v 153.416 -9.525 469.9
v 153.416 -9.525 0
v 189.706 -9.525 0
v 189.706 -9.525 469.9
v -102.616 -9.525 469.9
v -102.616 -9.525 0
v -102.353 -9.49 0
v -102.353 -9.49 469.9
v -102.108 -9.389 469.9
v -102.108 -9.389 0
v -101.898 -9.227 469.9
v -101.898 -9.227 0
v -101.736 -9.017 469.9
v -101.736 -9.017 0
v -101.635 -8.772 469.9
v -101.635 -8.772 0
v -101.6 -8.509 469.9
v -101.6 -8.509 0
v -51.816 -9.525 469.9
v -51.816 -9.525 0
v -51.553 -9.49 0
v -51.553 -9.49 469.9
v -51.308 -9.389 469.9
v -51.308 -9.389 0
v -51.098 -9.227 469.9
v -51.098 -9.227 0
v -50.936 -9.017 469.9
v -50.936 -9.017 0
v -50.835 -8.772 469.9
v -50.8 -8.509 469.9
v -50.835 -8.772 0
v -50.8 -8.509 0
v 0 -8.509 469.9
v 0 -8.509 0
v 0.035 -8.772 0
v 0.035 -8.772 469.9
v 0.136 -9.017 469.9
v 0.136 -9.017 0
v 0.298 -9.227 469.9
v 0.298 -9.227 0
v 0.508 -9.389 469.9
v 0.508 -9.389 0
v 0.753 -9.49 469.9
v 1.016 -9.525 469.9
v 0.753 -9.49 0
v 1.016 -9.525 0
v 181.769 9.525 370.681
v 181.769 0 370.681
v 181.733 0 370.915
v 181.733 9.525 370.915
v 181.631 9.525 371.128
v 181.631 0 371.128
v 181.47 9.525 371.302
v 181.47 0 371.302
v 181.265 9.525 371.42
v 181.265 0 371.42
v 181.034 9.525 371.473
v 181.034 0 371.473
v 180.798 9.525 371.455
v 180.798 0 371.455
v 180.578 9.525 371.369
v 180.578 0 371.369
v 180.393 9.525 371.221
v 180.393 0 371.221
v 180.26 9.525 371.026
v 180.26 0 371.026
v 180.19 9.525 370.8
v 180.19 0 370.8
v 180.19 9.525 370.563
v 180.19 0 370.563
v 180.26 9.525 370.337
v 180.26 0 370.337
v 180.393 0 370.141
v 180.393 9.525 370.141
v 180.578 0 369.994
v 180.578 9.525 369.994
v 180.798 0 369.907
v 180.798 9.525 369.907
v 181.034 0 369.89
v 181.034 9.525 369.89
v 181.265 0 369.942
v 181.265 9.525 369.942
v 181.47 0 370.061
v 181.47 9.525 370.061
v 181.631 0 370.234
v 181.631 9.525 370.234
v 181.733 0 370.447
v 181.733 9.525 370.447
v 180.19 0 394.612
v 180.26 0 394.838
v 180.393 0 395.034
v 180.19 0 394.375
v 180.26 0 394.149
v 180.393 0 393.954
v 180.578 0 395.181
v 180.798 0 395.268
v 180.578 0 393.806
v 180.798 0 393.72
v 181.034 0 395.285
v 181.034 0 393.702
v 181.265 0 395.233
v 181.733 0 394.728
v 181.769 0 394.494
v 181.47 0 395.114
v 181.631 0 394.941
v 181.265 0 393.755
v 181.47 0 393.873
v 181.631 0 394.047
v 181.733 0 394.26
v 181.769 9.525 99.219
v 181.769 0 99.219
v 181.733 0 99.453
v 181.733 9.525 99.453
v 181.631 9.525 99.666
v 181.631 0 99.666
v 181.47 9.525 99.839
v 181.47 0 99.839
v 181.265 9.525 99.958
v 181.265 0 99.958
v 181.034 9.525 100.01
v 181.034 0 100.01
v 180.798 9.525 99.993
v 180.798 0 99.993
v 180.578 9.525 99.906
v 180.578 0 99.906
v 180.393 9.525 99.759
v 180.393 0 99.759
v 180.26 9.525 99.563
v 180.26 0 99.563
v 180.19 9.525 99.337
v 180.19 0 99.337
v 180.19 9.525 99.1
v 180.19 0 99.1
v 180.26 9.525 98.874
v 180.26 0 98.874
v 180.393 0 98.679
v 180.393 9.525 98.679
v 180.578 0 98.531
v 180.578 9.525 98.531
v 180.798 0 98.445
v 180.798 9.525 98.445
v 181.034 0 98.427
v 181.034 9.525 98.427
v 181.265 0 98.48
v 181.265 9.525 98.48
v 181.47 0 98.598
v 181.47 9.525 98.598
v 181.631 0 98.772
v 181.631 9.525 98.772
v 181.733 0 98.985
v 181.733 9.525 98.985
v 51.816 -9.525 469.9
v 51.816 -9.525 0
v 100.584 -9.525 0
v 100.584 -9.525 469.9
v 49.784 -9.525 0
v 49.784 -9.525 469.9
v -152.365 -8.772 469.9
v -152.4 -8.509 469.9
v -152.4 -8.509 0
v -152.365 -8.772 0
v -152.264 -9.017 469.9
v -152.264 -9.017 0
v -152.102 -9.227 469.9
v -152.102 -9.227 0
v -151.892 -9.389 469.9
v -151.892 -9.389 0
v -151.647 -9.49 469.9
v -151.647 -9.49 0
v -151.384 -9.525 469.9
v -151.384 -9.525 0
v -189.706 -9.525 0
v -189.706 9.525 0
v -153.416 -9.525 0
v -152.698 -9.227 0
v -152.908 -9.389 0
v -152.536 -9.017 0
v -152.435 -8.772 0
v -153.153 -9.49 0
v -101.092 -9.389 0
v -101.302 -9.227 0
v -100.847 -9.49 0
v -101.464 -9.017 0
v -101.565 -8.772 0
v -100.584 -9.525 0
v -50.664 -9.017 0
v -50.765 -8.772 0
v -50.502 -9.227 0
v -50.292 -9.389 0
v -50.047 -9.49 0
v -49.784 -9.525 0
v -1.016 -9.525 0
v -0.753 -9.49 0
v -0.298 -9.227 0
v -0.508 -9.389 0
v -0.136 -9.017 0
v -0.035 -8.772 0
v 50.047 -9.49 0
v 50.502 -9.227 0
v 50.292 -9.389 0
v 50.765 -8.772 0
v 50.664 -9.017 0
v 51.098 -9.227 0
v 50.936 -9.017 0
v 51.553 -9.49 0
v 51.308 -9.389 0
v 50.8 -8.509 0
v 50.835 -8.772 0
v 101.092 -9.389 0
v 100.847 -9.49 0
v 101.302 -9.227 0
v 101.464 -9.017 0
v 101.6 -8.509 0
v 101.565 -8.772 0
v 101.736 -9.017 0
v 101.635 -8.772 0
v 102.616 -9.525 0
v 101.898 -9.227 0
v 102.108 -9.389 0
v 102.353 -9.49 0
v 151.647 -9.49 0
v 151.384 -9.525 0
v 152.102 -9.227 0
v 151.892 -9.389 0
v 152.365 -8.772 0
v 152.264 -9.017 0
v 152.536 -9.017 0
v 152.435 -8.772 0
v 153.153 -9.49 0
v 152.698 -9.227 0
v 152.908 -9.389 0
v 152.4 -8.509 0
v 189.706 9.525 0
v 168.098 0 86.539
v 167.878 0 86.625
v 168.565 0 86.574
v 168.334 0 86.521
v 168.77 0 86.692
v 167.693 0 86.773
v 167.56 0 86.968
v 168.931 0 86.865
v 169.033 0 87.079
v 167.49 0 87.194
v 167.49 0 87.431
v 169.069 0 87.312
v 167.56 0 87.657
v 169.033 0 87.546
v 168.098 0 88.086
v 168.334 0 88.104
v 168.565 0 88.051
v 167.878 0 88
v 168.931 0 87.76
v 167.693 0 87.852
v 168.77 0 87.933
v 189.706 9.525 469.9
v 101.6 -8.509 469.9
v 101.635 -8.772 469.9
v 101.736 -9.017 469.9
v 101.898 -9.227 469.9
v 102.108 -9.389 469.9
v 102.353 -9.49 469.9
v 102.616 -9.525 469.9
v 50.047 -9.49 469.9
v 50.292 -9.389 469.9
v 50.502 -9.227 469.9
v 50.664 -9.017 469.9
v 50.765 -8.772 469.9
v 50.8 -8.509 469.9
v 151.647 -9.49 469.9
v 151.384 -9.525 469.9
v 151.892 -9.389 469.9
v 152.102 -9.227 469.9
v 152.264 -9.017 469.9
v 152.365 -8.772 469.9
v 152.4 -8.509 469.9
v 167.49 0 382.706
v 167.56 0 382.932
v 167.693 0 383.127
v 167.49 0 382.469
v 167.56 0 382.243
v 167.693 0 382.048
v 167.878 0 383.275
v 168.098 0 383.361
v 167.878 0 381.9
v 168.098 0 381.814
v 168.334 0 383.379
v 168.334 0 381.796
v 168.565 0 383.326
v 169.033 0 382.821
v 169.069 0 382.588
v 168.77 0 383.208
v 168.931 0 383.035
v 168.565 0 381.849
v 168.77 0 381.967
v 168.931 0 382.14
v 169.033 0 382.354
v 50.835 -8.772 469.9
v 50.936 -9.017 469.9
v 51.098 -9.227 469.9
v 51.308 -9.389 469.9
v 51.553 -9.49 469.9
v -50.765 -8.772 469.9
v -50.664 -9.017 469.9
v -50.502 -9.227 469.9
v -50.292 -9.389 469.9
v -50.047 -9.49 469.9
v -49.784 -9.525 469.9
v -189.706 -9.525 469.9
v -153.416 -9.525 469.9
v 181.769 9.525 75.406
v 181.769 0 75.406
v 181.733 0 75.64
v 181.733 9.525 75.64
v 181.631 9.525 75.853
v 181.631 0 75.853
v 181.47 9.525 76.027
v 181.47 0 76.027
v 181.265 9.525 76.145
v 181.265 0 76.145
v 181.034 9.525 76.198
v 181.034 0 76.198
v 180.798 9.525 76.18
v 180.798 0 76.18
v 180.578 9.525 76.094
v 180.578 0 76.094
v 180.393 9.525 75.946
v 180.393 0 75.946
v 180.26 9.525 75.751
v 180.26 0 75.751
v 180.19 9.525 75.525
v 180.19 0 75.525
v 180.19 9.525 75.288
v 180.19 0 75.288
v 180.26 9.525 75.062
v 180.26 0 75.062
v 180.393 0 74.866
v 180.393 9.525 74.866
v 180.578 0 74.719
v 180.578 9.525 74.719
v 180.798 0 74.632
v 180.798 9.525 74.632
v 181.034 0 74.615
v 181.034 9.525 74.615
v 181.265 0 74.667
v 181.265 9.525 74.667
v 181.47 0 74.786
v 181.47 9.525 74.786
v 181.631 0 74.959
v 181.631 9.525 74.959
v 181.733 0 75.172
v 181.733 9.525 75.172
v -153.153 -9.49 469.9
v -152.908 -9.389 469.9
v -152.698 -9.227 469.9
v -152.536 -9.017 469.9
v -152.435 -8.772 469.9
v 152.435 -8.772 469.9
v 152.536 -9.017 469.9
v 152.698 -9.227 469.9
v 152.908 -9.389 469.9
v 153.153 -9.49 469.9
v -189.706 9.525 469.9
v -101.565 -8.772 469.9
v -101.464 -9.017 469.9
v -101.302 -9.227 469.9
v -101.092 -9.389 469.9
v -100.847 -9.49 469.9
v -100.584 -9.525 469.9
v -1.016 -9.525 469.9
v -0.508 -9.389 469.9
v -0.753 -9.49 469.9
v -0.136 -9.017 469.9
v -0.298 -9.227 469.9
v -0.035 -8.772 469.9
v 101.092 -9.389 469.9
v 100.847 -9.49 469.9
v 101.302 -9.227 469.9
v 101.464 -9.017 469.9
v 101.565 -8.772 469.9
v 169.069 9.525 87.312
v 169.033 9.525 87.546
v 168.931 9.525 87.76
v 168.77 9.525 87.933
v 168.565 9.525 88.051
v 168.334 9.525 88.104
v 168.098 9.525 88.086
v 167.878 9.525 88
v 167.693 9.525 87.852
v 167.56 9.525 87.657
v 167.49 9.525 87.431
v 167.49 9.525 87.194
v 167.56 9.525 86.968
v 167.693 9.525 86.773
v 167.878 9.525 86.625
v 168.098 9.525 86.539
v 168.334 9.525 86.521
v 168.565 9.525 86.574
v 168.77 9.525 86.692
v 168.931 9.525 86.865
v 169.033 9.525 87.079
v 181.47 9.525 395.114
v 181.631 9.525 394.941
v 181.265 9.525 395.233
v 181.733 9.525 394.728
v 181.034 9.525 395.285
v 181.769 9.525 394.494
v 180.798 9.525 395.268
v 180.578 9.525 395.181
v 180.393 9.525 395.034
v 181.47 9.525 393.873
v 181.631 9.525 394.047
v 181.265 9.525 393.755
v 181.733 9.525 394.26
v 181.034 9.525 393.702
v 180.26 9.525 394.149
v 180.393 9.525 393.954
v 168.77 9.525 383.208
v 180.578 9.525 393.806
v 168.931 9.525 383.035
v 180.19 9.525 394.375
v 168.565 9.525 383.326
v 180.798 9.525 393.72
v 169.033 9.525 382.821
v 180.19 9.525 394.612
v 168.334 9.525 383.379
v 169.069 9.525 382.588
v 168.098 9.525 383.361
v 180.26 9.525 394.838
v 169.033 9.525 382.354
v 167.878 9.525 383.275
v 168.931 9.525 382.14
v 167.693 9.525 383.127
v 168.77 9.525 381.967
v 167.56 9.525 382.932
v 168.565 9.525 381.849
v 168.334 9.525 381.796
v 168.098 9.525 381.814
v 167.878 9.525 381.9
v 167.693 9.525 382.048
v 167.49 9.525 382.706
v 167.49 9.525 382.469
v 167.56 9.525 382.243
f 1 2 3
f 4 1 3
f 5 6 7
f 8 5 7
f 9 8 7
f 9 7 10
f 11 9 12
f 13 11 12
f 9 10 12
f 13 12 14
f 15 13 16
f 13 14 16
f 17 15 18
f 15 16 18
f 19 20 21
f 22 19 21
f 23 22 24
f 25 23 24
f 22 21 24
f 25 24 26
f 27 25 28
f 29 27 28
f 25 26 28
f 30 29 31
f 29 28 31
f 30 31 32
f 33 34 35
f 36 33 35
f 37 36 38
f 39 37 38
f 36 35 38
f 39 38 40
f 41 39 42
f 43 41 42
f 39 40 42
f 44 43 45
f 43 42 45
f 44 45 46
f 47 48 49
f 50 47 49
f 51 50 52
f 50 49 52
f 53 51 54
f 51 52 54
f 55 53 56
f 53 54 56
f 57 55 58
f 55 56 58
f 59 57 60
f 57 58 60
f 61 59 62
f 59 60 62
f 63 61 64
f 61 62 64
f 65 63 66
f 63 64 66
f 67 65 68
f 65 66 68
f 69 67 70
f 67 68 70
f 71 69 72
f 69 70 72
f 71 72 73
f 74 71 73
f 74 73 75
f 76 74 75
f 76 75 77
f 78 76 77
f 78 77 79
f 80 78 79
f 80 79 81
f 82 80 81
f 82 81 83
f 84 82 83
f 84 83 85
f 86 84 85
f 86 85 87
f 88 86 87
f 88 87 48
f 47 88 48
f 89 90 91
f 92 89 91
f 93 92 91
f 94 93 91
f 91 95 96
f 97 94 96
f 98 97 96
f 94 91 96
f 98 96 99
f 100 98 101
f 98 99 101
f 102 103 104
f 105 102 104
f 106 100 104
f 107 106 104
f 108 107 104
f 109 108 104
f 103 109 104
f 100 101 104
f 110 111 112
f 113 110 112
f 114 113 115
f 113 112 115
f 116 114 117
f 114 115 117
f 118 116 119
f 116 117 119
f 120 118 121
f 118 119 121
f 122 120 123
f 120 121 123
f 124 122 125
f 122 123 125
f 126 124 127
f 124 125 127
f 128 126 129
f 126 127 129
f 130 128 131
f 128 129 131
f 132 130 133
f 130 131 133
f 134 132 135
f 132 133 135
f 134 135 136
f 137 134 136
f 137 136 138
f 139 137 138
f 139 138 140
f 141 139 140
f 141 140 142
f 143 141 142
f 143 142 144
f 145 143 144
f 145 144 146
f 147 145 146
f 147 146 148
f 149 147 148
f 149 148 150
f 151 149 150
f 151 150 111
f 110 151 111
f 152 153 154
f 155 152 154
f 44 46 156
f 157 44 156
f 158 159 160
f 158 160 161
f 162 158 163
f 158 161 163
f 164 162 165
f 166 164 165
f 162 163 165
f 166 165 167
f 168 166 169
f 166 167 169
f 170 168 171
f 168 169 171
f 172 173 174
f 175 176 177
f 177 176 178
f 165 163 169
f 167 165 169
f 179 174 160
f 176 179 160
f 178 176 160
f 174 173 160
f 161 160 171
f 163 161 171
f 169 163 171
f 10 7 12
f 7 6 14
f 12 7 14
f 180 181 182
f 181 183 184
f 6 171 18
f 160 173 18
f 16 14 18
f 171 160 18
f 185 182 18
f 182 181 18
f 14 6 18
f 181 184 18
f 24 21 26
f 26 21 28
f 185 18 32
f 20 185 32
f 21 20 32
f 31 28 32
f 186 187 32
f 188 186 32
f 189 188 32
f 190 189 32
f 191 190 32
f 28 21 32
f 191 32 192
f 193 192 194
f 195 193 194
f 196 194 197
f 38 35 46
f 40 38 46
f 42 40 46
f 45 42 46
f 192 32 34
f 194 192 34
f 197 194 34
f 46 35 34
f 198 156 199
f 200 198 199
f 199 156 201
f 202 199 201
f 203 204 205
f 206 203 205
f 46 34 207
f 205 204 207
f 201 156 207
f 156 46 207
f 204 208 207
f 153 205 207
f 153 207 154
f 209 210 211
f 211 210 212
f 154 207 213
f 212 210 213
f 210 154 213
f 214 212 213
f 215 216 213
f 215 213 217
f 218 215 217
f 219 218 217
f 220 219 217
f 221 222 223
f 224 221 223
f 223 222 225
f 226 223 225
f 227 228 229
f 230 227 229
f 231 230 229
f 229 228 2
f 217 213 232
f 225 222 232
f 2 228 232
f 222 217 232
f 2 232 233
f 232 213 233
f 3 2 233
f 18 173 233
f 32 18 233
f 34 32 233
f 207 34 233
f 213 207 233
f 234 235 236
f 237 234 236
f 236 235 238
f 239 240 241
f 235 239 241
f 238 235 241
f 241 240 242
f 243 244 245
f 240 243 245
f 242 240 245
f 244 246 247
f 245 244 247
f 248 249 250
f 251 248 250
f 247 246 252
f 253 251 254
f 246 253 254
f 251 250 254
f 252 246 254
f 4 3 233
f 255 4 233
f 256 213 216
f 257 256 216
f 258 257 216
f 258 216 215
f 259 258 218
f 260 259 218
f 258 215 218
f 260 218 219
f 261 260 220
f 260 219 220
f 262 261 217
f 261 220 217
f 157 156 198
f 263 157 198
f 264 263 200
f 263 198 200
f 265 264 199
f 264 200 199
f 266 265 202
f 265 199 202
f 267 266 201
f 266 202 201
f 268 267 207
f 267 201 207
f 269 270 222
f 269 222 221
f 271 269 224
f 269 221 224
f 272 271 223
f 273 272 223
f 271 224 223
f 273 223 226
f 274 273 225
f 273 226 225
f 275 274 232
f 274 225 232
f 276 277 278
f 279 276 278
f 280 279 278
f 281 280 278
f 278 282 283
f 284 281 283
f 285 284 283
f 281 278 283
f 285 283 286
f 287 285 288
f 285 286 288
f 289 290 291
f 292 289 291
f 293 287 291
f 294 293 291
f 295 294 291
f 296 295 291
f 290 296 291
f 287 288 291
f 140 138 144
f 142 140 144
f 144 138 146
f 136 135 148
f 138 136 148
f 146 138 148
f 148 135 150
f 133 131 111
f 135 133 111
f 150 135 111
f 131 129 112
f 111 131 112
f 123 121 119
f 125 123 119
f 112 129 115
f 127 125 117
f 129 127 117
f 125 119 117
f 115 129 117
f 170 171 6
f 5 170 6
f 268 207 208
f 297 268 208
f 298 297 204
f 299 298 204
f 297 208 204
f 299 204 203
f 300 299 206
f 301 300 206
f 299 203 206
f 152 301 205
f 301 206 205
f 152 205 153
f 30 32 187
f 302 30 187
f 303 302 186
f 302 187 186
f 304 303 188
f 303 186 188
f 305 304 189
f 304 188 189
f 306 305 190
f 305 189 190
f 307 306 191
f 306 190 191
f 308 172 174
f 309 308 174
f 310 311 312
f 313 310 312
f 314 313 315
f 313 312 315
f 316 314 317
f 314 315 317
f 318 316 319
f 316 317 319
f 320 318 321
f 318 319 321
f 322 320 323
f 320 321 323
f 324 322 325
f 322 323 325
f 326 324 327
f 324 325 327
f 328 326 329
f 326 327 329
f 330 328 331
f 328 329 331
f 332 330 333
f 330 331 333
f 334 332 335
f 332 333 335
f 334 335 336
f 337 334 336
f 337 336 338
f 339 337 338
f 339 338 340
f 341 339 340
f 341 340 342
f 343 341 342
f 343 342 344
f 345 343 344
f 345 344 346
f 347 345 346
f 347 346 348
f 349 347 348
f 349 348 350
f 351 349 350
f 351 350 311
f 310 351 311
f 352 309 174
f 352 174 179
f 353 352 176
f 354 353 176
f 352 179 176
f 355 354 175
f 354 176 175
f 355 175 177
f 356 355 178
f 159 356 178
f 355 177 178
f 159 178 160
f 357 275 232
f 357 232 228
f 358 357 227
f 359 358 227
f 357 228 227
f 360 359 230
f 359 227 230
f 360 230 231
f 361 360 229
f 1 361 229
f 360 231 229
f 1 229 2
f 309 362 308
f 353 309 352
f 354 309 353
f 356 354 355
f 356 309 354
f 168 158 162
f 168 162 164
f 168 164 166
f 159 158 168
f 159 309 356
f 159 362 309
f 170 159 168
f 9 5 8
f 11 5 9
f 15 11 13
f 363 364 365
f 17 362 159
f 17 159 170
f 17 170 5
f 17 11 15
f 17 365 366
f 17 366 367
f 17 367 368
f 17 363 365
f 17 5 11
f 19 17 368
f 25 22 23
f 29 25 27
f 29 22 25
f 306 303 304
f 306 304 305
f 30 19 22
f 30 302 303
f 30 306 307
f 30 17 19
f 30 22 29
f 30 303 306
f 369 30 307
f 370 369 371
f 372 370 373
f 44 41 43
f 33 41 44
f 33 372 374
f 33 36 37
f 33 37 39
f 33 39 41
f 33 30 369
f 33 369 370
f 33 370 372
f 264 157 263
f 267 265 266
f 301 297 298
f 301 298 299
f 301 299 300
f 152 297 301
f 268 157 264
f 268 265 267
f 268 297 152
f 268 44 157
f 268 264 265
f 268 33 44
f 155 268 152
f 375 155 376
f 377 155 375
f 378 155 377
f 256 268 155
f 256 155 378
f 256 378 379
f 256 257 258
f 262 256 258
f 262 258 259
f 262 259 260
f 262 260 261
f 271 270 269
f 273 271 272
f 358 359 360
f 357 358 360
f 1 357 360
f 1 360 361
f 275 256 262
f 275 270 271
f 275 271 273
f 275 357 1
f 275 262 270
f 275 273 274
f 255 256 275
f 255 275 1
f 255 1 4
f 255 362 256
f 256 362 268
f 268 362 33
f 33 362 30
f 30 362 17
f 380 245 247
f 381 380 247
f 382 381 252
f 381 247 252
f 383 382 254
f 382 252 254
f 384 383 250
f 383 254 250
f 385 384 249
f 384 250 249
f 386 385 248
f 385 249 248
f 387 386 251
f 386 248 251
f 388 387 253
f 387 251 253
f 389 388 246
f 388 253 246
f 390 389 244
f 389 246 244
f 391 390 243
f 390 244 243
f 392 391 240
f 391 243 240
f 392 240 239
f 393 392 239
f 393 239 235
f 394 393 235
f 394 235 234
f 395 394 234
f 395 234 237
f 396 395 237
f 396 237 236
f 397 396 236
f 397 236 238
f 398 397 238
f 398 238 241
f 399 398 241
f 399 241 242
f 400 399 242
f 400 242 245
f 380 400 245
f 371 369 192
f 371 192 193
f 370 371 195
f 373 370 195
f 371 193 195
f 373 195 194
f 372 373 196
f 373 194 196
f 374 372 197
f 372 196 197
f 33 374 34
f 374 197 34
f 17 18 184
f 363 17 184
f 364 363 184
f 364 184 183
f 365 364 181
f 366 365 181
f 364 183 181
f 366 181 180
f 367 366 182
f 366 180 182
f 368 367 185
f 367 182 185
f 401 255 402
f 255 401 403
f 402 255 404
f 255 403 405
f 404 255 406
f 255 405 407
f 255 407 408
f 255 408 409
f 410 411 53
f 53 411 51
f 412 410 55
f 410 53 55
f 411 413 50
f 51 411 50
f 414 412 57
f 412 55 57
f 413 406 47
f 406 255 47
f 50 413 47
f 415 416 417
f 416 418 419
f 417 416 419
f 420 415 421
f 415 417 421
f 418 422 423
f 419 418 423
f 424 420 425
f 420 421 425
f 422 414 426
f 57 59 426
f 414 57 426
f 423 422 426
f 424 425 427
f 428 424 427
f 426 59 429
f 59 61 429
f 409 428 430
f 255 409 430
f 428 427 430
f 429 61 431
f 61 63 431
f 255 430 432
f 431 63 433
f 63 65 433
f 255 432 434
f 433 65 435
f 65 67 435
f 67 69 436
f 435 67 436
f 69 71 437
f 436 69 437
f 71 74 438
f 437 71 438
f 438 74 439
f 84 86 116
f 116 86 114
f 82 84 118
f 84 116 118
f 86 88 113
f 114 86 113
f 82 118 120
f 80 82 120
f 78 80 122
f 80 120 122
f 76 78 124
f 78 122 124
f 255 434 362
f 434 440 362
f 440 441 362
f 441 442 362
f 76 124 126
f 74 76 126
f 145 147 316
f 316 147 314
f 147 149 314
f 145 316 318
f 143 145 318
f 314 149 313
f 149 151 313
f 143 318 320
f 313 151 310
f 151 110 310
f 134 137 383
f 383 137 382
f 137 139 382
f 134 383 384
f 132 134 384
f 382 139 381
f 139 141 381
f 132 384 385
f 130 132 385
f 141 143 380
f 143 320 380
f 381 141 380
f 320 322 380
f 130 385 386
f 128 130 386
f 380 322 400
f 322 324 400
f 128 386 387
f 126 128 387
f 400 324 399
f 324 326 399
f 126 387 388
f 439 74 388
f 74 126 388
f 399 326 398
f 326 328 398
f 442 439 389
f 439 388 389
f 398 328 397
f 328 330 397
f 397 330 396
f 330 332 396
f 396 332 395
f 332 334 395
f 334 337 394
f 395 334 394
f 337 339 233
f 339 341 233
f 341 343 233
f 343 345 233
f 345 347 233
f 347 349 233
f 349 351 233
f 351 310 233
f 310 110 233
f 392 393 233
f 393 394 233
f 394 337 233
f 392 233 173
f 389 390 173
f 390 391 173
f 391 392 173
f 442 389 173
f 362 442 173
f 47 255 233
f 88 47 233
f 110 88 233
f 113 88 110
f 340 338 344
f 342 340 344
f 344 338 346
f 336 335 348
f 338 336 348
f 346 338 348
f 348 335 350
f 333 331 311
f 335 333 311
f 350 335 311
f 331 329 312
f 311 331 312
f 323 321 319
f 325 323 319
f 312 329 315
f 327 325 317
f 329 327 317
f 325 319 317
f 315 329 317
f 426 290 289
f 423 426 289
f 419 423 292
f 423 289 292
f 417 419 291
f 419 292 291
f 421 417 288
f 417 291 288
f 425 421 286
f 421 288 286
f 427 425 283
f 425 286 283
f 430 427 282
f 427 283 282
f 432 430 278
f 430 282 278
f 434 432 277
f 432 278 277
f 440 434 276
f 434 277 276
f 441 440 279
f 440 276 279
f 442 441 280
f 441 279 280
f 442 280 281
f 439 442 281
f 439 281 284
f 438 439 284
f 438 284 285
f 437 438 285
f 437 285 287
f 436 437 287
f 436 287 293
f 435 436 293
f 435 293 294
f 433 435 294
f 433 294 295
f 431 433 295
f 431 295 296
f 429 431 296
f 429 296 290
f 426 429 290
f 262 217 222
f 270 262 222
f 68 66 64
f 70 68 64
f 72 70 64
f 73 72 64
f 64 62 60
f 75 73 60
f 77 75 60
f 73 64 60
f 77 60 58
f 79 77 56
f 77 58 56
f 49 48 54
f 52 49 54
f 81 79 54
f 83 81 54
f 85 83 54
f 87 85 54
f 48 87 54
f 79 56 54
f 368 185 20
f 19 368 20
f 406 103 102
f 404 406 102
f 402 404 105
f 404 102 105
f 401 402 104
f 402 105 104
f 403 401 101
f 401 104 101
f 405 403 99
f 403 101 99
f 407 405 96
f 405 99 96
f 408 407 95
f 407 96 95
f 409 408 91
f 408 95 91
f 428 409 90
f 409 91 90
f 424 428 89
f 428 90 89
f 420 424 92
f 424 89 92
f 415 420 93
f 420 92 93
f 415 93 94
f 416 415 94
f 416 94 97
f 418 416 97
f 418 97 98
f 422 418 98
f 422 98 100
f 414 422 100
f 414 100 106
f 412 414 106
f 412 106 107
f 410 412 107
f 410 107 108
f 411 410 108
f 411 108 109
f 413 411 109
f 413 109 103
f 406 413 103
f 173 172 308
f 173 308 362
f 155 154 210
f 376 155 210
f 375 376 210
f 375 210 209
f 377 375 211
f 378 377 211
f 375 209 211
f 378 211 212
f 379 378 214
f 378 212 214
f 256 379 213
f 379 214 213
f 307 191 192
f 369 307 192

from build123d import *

# Parameters (mm, degrees)
F1_DEPTH = 469.9
F2_W     = 343.069662
F2_H     = 137.227848
F2_W_2   = 381
F2_H_2   = 195.285798
F3_DEPTH = 1143
F4_R     = 0.79375
F5_DEPTH = 25.4


with BuildPart() as f1:
    # F0 (on Top) → F1 (new body)
    with BuildSketch(Plane.XY):
        with BuildLine():
            Line((458.216, -9.525), (508, -9.525))
            Line((508, -9.525), (508, 9.525))
            Line((508, 9.525), (-508, 9.525))
            Line((-508, 9.525), (-508, -8.509))
            ThreePointArc((-508, -8.509), (-507.70242, -9.22742), (-506.984, -9.525))
            Line((-506.984, -9.525), (-458.216, -9.525))
            ThreePointArc((-458.216, -9.525), (-457.49758, -9.22742), (-457.2, -8.509))
            ThreePointArc((-457.2, -8.509), (-456.90242, -9.22742), (-456.184, -9.525))
            Line((-456.184, -9.525), (-407.416, -9.525))
            ThreePointArc((-407.416, -9.525), (-406.69758, -9.22742), (-406.4, -8.509))
            ThreePointArc((-406.4, -8.509), (-406.10242, -9.22742), (-405.384, -9.525))
            Line((-405.384, -9.525), (-356.616, -9.525))
            ThreePointArc((-356.616, -9.525), (-355.89758, -9.22742), (-355.6, -8.509))
            ThreePointArc((-355.6, -8.509), (-355.30242, -9.22742), (-354.584, -9.525))
            Line((-354.584, -9.525), (-305.816, -9.525))
            ThreePointArc((-305.816, -9.525), (-305.09758, -9.22742), (-304.8, -8.509))
            ThreePointArc((-304.8, -8.509), (-304.50242, -9.22742), (-303.784, -9.525))
            Line((-303.784, -9.525), (-255.016, -9.525))
            ThreePointArc((-255.016, -9.525), (-254.29758, -9.22742), (-254, -8.509))
            ThreePointArc((-254, -8.509), (-253.70242, -9.22742), (-252.984, -9.525))
            Line((-252.984, -9.525), (-204.216, -9.525))
            ThreePointArc((-204.216, -9.525), (-203.49758, -9.22742), (-203.2, -8.509))
            ThreePointArc((-203.2, -8.509), (-202.90242, -9.22742), (-202.184, -9.525))
            Line((-202.184, -9.525), (-153.416, -9.525))
            ThreePointArc((-153.416, -9.525), (-152.69758, -9.22742), (-152.4, -8.509))
            ThreePointArc((-152.4, -8.509), (-152.10242, -9.22742), (-151.384, -9.525))
            Line((-151.384, -9.525), (-102.616, -9.525))
            ThreePointArc((-102.616, -9.525), (-101.89758, -9.22742), (-101.6, -8.509))
            ThreePointArc((-101.6, -8.509), (-101.30242, -9.22742), (-100.584, -9.525))
            Line((-100.584, -9.525), (-51.816, -9.525))
            ThreePointArc((-51.816, -9.525), (-51.09758, -9.22742), (-50.8, -8.509))
            ThreePointArc((-50.8, -8.509), (-50.50242, -9.22742), (-49.784, -9.525))
            Line((-49.784, -9.525), (-1.016, -9.525))
            ThreePointArc((-1.016, -9.525), (-0.29758, -9.22742), (0, -8.509))
            ThreePointArc((0, -8.509), (0.29758, -9.22742), (1.016, -9.525))
            Line((1.016, -9.525), (49.784, -9.525))
            ThreePointArc((49.784, -9.525), (50.50242, -9.22742), (50.8, -8.509))
            ThreePointArc((50.8, -8.509), (51.09758, -9.22742), (51.816, -9.525))
            Line((51.816, -9.525), (100.584, -9.525))
            ThreePointArc((100.584, -9.525), (101.30242, -9.22742), (101.6, -8.509))
            ThreePointArc((101.6, -8.509), (101.89758, -9.22742), (102.616, -9.525))
            Line((102.616, -9.525), (151.384, -9.525))
            ThreePointArc((151.384, -9.525), (152.10242, -9.22742), (152.4, -8.509))
            ThreePointArc((152.4, -8.509), (152.69758, -9.22742), (153.416, -9.525))
            Line((153.416, -9.525), (202.184, -9.525))
            ThreePointArc((202.184, -9.525), (202.90242, -9.22742), (203.2, -8.509))
            ThreePointArc((203.2, -8.509), (203.49758, -9.22742), (204.216, -9.525))
            Line((204.216, -9.525), (252.984, -9.525))
            ThreePointArc((252.984, -9.525), (253.70242, -9.22742), (254, -8.509))
            ThreePointArc((254, -8.509), (254.29758, -9.22742), (255.016, -9.525))
            Line((255.016, -9.525), (303.784, -9.525))
            ThreePointArc((303.784, -9.525), (304.50242, -9.22742), (304.8, -8.509))
            ThreePointArc((304.8, -8.509), (305.09758, -9.22742), (305.816, -9.525))
            Line((305.816, -9.525), (354.584, -9.525))
            ThreePointArc((354.584, -9.525), (355.30242, -9.22742), (355.6, -8.509))
            ThreePointArc((355.6, -8.509), (355.89758, -9.22742), (356.616, -9.525))
            Line((356.616, -9.525), (405.384, -9.525))
            ThreePointArc((405.384, -9.525), (406.10242, -9.22742), (406.4, -8.509))
            ThreePointArc((406.4, -8.509), (406.69758, -9.22742), (407.416, -9.525))
            Line((407.416, -9.525), (456.184, -9.525))
            ThreePointArc((456.184, -9.525), (456.90242, -9.22742), (457.2, -8.509))
            ThreePointArc((457.2, -8.509), (457.49758, -9.22742), (458.216, -9.525))
        make_face()
        with BuildLine():
            ThreePointArc((-506.984, -9.525), (-507.70242, -9.22742), (-508, -8.509))
            Line((-508, -8.509), (-508, -9.525))
            Line((-508, -9.525), (-506.984, -9.525))
        make_face()
    extrude(amount=F1_DEPTH)

    # F2 (on Top) → F3 (cut)
    with BuildSketch(Plane.XY):
        with Locations((361.241081, -20.971623)):
            Rectangle(F2_W, F2_H)
        with Locations((-380.20625, -39.444607)):
            Rectangle(F2_W_2, F2_H_2)
    extrude(amount=F3_DEPTH, mode=Mode.SUBTRACT)

    # F4 (on Front) → F5 (cut)
    with BuildSketch(Plane.XZ):
        with Locations((180.975, 394.49375)):
            Circle(F4_R)
        with Locations((168.275, 382.5875)):
            Circle(F4_R)
        with Locations((180.975, 370.68125)):
            Circle(F4_R)
        with Locations((180.975, 99.21875)):
            Circle(F4_R)
        with Locations((168.275, 87.3125)):
            Circle(F4_R)
        with Locations((180.975, 75.40625)):
            Circle(F4_R)
    extrude(amount=-F5_DEPTH, mode=Mode.SUBTRACT)


solid = f1.part
